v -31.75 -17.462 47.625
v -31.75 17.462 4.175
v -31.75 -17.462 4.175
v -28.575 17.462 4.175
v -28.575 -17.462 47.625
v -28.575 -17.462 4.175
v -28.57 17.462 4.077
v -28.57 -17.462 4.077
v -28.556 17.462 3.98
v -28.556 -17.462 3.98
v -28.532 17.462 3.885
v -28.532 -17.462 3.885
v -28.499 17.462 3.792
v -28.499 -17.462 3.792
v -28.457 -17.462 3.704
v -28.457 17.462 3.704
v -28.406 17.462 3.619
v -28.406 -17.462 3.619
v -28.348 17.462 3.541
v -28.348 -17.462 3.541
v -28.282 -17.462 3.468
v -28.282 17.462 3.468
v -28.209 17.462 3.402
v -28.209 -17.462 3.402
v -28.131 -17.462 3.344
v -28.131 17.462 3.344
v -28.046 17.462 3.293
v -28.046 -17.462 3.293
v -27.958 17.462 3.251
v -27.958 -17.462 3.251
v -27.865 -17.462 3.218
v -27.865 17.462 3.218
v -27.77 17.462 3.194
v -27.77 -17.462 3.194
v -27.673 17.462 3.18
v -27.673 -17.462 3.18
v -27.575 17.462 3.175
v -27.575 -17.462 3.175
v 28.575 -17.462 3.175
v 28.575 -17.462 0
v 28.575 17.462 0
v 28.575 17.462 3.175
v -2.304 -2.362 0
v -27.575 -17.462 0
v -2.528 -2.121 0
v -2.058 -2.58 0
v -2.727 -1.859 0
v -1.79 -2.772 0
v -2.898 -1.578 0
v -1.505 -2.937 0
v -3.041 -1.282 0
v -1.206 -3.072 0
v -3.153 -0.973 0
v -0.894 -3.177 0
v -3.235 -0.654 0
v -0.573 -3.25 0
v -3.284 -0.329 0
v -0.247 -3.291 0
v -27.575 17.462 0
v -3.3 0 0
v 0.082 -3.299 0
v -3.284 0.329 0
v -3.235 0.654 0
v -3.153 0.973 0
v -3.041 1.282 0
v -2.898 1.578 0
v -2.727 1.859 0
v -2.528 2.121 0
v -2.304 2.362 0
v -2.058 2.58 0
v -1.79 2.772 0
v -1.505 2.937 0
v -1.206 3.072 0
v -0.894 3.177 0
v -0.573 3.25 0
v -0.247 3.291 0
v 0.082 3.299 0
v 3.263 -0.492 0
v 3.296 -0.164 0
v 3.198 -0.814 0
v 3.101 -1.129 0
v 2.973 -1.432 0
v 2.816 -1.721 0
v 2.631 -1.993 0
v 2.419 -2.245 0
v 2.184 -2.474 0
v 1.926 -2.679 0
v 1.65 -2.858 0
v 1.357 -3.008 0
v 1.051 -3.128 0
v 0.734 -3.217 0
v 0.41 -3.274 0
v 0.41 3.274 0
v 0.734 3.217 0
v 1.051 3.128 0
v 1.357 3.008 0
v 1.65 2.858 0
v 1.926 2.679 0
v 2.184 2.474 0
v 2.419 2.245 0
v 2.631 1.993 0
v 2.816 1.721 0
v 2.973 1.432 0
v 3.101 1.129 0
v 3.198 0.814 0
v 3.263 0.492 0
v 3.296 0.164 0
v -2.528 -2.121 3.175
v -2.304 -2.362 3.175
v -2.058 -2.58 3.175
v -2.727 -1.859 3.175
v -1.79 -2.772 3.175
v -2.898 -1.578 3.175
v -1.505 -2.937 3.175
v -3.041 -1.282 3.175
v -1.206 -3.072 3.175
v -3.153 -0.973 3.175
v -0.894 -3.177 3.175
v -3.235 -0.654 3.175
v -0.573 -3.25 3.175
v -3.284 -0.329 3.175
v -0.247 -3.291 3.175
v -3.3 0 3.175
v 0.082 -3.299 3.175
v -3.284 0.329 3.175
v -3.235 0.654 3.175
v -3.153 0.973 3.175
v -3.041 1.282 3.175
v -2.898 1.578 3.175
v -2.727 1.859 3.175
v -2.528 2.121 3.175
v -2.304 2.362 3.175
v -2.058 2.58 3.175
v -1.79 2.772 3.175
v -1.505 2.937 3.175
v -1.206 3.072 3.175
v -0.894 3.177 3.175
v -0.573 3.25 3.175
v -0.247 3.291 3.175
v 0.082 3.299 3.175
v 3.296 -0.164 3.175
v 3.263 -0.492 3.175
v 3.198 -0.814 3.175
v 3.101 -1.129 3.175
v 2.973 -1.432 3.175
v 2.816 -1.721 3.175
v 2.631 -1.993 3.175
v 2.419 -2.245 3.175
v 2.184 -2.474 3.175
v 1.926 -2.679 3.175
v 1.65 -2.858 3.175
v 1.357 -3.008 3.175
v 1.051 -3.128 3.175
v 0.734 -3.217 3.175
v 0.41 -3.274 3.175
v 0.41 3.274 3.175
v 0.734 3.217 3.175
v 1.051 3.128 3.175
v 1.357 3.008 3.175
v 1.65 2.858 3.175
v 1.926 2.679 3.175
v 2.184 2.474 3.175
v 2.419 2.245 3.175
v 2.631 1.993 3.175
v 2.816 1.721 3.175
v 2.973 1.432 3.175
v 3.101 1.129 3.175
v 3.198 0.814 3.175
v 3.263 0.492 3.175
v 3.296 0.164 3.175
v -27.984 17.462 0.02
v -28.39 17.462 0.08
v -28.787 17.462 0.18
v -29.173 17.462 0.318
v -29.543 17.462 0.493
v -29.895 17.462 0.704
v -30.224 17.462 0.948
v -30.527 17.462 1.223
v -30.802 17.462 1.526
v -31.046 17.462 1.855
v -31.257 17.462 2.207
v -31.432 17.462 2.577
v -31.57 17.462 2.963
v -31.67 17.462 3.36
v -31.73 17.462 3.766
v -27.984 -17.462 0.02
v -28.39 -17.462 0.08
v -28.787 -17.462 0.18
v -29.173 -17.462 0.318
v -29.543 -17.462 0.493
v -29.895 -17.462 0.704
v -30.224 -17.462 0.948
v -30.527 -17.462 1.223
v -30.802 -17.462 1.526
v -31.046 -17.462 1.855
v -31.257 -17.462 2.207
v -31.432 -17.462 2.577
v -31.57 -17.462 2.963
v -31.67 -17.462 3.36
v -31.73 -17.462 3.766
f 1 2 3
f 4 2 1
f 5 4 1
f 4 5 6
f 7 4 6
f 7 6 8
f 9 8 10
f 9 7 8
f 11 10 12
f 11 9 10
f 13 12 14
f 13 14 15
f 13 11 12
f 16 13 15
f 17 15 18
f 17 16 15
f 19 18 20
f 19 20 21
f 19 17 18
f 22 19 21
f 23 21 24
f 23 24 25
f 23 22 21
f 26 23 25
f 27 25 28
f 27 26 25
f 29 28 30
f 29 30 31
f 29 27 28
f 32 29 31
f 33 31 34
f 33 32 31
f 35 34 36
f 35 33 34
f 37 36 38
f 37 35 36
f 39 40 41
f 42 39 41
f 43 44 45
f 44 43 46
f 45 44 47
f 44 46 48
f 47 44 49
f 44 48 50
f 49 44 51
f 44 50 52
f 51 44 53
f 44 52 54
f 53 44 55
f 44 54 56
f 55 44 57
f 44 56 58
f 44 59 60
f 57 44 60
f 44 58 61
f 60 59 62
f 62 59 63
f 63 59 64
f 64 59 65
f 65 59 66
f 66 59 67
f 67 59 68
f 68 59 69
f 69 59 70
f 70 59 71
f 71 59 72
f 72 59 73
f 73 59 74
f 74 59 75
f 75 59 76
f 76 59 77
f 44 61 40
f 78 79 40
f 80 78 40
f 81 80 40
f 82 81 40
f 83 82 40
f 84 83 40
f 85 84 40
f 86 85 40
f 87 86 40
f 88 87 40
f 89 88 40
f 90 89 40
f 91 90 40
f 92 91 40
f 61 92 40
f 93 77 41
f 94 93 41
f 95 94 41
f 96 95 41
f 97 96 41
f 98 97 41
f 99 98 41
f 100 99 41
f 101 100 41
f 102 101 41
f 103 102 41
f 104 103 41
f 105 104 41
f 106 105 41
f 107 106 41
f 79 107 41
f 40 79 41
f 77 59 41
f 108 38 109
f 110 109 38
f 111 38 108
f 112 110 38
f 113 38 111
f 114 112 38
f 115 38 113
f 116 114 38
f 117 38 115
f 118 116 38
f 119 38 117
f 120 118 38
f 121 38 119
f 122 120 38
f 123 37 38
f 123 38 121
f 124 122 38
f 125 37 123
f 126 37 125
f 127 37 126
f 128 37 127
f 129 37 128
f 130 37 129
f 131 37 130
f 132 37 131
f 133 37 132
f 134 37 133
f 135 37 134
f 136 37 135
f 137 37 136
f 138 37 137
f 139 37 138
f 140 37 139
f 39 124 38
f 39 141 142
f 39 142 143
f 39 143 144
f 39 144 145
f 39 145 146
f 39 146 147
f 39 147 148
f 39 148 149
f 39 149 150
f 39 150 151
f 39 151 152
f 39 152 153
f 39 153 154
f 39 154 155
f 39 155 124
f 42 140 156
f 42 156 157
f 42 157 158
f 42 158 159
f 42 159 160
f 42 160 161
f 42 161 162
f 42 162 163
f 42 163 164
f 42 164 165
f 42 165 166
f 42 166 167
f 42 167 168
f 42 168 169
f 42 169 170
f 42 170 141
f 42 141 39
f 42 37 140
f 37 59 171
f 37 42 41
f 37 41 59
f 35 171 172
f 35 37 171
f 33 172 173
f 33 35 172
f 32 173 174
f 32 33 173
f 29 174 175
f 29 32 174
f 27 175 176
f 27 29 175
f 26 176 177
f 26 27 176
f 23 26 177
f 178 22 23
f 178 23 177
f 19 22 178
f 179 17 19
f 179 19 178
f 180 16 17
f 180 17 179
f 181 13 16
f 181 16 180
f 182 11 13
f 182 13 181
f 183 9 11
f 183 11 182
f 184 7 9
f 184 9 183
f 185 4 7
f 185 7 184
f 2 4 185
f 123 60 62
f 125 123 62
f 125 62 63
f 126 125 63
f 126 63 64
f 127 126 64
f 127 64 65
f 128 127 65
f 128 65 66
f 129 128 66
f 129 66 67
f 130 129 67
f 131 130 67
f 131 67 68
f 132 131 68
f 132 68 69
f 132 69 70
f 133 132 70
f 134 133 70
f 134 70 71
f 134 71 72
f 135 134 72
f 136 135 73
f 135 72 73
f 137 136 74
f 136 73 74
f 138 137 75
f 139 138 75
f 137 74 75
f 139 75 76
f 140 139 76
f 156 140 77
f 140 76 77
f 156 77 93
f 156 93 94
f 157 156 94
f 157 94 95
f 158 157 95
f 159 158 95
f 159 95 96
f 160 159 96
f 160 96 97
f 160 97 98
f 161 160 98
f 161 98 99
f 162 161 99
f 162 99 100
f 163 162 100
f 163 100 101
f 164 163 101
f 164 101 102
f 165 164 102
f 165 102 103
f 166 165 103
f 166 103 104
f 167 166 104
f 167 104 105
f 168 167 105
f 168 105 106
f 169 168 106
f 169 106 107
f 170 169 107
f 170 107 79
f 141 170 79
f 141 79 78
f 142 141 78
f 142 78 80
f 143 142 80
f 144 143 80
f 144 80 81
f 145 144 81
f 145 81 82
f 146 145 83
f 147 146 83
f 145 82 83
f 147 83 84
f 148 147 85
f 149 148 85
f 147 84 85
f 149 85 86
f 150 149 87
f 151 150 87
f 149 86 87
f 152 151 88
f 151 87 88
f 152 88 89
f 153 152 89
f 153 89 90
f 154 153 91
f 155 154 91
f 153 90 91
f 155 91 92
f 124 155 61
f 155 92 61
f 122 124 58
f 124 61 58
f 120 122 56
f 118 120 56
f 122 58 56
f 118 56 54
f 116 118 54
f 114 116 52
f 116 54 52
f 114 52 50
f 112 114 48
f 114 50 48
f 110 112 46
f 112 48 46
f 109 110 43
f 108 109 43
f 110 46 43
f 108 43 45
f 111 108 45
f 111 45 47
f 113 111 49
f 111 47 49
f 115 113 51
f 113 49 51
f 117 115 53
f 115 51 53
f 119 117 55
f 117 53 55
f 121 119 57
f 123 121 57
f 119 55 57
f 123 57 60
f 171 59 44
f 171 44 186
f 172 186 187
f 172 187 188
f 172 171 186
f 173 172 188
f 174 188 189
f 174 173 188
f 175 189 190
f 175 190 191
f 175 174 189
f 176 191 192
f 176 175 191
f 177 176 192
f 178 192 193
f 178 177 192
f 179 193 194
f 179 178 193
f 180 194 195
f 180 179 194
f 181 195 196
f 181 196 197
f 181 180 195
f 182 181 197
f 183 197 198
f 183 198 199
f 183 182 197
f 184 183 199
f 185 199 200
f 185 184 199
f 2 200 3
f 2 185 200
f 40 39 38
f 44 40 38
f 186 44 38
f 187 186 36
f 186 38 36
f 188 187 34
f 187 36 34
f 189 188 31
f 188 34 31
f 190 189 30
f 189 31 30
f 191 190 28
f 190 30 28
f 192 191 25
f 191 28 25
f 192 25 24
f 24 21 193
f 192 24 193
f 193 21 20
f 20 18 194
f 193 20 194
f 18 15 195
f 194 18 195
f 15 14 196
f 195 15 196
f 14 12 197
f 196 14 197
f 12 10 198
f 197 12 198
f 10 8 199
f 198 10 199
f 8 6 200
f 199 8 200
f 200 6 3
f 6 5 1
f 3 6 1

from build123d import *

# Parameters (mm, degrees)
SKETCH2_W                    = 57.15
SKETCH2_H                    = 34.925
BASE_FLANGE1_DEPTH           = 3.175
M6_CLEARANCE_HOLE1_D         = 6.6
EDGE_FLANGE2_STRIP_W         = 14.7
EDGE_FLANGE2_STRIP_H         = 3.175
EDGE_FLANGE2_STRIP_CUT_DEPTH = 34.925
EDGE_FLANGE2_DEPTH           = 34.925
CUT_EXTRUDE2_DEPTH           = 79.817416579


# Sheet-metal steps are written as plain solids
with BuildPart() as part:
    # Sketch2 → Base-Flange1 (new body)
    with BuildSketch(Plane.XY):
        Rectangle(SKETCH2_W, SKETCH2_H)
    extrude(amount=BASE_FLANGE1_DEPTH)

    # M6 Clearance Hole1 (through all)
    with Locations(Plane.XY.offset(3.175)):
        with Locations((0, 0)):
            Hole(M6_CLEARANCE_HOLE1_D / 2)

    # Edge-Flange2 strip (across the edge) → Edge-Flange2 strip cut (cut)
    with BuildSketch(Plane(origin=(-28.575, 17.4625, 3.175), x_dir=(1, 0, 0), z_dir=(0, -1, 0))):
        with Locations((-6.35, -1.5875)):
            Rectangle(EDGE_FLANGE2_STRIP_W, EDGE_FLANGE2_STRIP_H)
    extrude(amount=EDGE_FLANGE2_STRIP_CUT_DEPTH, mode=Mode.SUBTRACT)

    # Edge-Flange2 section (across the edge) → Edge-Flange2 (add)
    with BuildSketch(Plane(origin=(-28.575, 17.4625, 3.175), x_dir=(1, 0, 0), z_dir=(0, -1, 0))):
        with BuildLine():
            Line((-3.175, 1), (-3.175, 44.45))
            Line((-3.175, 44.45), (0, 44.45))
            Line((0, 44.45), (0, 1))
            ThreePointArc((0, 1), (0.292893219, 0.292893219), (1, 0))
            Line((1, 0), (1, -3.175))
            ThreePointArc((1, -3.175), (-1.952170811, -1.952170811), (-3.175, 1))
        make_face()
    extrude(amount=EDGE_FLANGE2_DEPTH)

    # Sketch20 → Cut-Extrude2 (cut, through all)
    with BuildSketch(Plane.ZY.offset(31.75)):
        Polygon((4.175, 17.4625), (47.625, -17.4625), (47.625, 17.4625), align=None)
    extrude(amount=-CUT_EXTRUDE2_DEPTH, mode=Mode.SUBTRACT)


solid = part.part
